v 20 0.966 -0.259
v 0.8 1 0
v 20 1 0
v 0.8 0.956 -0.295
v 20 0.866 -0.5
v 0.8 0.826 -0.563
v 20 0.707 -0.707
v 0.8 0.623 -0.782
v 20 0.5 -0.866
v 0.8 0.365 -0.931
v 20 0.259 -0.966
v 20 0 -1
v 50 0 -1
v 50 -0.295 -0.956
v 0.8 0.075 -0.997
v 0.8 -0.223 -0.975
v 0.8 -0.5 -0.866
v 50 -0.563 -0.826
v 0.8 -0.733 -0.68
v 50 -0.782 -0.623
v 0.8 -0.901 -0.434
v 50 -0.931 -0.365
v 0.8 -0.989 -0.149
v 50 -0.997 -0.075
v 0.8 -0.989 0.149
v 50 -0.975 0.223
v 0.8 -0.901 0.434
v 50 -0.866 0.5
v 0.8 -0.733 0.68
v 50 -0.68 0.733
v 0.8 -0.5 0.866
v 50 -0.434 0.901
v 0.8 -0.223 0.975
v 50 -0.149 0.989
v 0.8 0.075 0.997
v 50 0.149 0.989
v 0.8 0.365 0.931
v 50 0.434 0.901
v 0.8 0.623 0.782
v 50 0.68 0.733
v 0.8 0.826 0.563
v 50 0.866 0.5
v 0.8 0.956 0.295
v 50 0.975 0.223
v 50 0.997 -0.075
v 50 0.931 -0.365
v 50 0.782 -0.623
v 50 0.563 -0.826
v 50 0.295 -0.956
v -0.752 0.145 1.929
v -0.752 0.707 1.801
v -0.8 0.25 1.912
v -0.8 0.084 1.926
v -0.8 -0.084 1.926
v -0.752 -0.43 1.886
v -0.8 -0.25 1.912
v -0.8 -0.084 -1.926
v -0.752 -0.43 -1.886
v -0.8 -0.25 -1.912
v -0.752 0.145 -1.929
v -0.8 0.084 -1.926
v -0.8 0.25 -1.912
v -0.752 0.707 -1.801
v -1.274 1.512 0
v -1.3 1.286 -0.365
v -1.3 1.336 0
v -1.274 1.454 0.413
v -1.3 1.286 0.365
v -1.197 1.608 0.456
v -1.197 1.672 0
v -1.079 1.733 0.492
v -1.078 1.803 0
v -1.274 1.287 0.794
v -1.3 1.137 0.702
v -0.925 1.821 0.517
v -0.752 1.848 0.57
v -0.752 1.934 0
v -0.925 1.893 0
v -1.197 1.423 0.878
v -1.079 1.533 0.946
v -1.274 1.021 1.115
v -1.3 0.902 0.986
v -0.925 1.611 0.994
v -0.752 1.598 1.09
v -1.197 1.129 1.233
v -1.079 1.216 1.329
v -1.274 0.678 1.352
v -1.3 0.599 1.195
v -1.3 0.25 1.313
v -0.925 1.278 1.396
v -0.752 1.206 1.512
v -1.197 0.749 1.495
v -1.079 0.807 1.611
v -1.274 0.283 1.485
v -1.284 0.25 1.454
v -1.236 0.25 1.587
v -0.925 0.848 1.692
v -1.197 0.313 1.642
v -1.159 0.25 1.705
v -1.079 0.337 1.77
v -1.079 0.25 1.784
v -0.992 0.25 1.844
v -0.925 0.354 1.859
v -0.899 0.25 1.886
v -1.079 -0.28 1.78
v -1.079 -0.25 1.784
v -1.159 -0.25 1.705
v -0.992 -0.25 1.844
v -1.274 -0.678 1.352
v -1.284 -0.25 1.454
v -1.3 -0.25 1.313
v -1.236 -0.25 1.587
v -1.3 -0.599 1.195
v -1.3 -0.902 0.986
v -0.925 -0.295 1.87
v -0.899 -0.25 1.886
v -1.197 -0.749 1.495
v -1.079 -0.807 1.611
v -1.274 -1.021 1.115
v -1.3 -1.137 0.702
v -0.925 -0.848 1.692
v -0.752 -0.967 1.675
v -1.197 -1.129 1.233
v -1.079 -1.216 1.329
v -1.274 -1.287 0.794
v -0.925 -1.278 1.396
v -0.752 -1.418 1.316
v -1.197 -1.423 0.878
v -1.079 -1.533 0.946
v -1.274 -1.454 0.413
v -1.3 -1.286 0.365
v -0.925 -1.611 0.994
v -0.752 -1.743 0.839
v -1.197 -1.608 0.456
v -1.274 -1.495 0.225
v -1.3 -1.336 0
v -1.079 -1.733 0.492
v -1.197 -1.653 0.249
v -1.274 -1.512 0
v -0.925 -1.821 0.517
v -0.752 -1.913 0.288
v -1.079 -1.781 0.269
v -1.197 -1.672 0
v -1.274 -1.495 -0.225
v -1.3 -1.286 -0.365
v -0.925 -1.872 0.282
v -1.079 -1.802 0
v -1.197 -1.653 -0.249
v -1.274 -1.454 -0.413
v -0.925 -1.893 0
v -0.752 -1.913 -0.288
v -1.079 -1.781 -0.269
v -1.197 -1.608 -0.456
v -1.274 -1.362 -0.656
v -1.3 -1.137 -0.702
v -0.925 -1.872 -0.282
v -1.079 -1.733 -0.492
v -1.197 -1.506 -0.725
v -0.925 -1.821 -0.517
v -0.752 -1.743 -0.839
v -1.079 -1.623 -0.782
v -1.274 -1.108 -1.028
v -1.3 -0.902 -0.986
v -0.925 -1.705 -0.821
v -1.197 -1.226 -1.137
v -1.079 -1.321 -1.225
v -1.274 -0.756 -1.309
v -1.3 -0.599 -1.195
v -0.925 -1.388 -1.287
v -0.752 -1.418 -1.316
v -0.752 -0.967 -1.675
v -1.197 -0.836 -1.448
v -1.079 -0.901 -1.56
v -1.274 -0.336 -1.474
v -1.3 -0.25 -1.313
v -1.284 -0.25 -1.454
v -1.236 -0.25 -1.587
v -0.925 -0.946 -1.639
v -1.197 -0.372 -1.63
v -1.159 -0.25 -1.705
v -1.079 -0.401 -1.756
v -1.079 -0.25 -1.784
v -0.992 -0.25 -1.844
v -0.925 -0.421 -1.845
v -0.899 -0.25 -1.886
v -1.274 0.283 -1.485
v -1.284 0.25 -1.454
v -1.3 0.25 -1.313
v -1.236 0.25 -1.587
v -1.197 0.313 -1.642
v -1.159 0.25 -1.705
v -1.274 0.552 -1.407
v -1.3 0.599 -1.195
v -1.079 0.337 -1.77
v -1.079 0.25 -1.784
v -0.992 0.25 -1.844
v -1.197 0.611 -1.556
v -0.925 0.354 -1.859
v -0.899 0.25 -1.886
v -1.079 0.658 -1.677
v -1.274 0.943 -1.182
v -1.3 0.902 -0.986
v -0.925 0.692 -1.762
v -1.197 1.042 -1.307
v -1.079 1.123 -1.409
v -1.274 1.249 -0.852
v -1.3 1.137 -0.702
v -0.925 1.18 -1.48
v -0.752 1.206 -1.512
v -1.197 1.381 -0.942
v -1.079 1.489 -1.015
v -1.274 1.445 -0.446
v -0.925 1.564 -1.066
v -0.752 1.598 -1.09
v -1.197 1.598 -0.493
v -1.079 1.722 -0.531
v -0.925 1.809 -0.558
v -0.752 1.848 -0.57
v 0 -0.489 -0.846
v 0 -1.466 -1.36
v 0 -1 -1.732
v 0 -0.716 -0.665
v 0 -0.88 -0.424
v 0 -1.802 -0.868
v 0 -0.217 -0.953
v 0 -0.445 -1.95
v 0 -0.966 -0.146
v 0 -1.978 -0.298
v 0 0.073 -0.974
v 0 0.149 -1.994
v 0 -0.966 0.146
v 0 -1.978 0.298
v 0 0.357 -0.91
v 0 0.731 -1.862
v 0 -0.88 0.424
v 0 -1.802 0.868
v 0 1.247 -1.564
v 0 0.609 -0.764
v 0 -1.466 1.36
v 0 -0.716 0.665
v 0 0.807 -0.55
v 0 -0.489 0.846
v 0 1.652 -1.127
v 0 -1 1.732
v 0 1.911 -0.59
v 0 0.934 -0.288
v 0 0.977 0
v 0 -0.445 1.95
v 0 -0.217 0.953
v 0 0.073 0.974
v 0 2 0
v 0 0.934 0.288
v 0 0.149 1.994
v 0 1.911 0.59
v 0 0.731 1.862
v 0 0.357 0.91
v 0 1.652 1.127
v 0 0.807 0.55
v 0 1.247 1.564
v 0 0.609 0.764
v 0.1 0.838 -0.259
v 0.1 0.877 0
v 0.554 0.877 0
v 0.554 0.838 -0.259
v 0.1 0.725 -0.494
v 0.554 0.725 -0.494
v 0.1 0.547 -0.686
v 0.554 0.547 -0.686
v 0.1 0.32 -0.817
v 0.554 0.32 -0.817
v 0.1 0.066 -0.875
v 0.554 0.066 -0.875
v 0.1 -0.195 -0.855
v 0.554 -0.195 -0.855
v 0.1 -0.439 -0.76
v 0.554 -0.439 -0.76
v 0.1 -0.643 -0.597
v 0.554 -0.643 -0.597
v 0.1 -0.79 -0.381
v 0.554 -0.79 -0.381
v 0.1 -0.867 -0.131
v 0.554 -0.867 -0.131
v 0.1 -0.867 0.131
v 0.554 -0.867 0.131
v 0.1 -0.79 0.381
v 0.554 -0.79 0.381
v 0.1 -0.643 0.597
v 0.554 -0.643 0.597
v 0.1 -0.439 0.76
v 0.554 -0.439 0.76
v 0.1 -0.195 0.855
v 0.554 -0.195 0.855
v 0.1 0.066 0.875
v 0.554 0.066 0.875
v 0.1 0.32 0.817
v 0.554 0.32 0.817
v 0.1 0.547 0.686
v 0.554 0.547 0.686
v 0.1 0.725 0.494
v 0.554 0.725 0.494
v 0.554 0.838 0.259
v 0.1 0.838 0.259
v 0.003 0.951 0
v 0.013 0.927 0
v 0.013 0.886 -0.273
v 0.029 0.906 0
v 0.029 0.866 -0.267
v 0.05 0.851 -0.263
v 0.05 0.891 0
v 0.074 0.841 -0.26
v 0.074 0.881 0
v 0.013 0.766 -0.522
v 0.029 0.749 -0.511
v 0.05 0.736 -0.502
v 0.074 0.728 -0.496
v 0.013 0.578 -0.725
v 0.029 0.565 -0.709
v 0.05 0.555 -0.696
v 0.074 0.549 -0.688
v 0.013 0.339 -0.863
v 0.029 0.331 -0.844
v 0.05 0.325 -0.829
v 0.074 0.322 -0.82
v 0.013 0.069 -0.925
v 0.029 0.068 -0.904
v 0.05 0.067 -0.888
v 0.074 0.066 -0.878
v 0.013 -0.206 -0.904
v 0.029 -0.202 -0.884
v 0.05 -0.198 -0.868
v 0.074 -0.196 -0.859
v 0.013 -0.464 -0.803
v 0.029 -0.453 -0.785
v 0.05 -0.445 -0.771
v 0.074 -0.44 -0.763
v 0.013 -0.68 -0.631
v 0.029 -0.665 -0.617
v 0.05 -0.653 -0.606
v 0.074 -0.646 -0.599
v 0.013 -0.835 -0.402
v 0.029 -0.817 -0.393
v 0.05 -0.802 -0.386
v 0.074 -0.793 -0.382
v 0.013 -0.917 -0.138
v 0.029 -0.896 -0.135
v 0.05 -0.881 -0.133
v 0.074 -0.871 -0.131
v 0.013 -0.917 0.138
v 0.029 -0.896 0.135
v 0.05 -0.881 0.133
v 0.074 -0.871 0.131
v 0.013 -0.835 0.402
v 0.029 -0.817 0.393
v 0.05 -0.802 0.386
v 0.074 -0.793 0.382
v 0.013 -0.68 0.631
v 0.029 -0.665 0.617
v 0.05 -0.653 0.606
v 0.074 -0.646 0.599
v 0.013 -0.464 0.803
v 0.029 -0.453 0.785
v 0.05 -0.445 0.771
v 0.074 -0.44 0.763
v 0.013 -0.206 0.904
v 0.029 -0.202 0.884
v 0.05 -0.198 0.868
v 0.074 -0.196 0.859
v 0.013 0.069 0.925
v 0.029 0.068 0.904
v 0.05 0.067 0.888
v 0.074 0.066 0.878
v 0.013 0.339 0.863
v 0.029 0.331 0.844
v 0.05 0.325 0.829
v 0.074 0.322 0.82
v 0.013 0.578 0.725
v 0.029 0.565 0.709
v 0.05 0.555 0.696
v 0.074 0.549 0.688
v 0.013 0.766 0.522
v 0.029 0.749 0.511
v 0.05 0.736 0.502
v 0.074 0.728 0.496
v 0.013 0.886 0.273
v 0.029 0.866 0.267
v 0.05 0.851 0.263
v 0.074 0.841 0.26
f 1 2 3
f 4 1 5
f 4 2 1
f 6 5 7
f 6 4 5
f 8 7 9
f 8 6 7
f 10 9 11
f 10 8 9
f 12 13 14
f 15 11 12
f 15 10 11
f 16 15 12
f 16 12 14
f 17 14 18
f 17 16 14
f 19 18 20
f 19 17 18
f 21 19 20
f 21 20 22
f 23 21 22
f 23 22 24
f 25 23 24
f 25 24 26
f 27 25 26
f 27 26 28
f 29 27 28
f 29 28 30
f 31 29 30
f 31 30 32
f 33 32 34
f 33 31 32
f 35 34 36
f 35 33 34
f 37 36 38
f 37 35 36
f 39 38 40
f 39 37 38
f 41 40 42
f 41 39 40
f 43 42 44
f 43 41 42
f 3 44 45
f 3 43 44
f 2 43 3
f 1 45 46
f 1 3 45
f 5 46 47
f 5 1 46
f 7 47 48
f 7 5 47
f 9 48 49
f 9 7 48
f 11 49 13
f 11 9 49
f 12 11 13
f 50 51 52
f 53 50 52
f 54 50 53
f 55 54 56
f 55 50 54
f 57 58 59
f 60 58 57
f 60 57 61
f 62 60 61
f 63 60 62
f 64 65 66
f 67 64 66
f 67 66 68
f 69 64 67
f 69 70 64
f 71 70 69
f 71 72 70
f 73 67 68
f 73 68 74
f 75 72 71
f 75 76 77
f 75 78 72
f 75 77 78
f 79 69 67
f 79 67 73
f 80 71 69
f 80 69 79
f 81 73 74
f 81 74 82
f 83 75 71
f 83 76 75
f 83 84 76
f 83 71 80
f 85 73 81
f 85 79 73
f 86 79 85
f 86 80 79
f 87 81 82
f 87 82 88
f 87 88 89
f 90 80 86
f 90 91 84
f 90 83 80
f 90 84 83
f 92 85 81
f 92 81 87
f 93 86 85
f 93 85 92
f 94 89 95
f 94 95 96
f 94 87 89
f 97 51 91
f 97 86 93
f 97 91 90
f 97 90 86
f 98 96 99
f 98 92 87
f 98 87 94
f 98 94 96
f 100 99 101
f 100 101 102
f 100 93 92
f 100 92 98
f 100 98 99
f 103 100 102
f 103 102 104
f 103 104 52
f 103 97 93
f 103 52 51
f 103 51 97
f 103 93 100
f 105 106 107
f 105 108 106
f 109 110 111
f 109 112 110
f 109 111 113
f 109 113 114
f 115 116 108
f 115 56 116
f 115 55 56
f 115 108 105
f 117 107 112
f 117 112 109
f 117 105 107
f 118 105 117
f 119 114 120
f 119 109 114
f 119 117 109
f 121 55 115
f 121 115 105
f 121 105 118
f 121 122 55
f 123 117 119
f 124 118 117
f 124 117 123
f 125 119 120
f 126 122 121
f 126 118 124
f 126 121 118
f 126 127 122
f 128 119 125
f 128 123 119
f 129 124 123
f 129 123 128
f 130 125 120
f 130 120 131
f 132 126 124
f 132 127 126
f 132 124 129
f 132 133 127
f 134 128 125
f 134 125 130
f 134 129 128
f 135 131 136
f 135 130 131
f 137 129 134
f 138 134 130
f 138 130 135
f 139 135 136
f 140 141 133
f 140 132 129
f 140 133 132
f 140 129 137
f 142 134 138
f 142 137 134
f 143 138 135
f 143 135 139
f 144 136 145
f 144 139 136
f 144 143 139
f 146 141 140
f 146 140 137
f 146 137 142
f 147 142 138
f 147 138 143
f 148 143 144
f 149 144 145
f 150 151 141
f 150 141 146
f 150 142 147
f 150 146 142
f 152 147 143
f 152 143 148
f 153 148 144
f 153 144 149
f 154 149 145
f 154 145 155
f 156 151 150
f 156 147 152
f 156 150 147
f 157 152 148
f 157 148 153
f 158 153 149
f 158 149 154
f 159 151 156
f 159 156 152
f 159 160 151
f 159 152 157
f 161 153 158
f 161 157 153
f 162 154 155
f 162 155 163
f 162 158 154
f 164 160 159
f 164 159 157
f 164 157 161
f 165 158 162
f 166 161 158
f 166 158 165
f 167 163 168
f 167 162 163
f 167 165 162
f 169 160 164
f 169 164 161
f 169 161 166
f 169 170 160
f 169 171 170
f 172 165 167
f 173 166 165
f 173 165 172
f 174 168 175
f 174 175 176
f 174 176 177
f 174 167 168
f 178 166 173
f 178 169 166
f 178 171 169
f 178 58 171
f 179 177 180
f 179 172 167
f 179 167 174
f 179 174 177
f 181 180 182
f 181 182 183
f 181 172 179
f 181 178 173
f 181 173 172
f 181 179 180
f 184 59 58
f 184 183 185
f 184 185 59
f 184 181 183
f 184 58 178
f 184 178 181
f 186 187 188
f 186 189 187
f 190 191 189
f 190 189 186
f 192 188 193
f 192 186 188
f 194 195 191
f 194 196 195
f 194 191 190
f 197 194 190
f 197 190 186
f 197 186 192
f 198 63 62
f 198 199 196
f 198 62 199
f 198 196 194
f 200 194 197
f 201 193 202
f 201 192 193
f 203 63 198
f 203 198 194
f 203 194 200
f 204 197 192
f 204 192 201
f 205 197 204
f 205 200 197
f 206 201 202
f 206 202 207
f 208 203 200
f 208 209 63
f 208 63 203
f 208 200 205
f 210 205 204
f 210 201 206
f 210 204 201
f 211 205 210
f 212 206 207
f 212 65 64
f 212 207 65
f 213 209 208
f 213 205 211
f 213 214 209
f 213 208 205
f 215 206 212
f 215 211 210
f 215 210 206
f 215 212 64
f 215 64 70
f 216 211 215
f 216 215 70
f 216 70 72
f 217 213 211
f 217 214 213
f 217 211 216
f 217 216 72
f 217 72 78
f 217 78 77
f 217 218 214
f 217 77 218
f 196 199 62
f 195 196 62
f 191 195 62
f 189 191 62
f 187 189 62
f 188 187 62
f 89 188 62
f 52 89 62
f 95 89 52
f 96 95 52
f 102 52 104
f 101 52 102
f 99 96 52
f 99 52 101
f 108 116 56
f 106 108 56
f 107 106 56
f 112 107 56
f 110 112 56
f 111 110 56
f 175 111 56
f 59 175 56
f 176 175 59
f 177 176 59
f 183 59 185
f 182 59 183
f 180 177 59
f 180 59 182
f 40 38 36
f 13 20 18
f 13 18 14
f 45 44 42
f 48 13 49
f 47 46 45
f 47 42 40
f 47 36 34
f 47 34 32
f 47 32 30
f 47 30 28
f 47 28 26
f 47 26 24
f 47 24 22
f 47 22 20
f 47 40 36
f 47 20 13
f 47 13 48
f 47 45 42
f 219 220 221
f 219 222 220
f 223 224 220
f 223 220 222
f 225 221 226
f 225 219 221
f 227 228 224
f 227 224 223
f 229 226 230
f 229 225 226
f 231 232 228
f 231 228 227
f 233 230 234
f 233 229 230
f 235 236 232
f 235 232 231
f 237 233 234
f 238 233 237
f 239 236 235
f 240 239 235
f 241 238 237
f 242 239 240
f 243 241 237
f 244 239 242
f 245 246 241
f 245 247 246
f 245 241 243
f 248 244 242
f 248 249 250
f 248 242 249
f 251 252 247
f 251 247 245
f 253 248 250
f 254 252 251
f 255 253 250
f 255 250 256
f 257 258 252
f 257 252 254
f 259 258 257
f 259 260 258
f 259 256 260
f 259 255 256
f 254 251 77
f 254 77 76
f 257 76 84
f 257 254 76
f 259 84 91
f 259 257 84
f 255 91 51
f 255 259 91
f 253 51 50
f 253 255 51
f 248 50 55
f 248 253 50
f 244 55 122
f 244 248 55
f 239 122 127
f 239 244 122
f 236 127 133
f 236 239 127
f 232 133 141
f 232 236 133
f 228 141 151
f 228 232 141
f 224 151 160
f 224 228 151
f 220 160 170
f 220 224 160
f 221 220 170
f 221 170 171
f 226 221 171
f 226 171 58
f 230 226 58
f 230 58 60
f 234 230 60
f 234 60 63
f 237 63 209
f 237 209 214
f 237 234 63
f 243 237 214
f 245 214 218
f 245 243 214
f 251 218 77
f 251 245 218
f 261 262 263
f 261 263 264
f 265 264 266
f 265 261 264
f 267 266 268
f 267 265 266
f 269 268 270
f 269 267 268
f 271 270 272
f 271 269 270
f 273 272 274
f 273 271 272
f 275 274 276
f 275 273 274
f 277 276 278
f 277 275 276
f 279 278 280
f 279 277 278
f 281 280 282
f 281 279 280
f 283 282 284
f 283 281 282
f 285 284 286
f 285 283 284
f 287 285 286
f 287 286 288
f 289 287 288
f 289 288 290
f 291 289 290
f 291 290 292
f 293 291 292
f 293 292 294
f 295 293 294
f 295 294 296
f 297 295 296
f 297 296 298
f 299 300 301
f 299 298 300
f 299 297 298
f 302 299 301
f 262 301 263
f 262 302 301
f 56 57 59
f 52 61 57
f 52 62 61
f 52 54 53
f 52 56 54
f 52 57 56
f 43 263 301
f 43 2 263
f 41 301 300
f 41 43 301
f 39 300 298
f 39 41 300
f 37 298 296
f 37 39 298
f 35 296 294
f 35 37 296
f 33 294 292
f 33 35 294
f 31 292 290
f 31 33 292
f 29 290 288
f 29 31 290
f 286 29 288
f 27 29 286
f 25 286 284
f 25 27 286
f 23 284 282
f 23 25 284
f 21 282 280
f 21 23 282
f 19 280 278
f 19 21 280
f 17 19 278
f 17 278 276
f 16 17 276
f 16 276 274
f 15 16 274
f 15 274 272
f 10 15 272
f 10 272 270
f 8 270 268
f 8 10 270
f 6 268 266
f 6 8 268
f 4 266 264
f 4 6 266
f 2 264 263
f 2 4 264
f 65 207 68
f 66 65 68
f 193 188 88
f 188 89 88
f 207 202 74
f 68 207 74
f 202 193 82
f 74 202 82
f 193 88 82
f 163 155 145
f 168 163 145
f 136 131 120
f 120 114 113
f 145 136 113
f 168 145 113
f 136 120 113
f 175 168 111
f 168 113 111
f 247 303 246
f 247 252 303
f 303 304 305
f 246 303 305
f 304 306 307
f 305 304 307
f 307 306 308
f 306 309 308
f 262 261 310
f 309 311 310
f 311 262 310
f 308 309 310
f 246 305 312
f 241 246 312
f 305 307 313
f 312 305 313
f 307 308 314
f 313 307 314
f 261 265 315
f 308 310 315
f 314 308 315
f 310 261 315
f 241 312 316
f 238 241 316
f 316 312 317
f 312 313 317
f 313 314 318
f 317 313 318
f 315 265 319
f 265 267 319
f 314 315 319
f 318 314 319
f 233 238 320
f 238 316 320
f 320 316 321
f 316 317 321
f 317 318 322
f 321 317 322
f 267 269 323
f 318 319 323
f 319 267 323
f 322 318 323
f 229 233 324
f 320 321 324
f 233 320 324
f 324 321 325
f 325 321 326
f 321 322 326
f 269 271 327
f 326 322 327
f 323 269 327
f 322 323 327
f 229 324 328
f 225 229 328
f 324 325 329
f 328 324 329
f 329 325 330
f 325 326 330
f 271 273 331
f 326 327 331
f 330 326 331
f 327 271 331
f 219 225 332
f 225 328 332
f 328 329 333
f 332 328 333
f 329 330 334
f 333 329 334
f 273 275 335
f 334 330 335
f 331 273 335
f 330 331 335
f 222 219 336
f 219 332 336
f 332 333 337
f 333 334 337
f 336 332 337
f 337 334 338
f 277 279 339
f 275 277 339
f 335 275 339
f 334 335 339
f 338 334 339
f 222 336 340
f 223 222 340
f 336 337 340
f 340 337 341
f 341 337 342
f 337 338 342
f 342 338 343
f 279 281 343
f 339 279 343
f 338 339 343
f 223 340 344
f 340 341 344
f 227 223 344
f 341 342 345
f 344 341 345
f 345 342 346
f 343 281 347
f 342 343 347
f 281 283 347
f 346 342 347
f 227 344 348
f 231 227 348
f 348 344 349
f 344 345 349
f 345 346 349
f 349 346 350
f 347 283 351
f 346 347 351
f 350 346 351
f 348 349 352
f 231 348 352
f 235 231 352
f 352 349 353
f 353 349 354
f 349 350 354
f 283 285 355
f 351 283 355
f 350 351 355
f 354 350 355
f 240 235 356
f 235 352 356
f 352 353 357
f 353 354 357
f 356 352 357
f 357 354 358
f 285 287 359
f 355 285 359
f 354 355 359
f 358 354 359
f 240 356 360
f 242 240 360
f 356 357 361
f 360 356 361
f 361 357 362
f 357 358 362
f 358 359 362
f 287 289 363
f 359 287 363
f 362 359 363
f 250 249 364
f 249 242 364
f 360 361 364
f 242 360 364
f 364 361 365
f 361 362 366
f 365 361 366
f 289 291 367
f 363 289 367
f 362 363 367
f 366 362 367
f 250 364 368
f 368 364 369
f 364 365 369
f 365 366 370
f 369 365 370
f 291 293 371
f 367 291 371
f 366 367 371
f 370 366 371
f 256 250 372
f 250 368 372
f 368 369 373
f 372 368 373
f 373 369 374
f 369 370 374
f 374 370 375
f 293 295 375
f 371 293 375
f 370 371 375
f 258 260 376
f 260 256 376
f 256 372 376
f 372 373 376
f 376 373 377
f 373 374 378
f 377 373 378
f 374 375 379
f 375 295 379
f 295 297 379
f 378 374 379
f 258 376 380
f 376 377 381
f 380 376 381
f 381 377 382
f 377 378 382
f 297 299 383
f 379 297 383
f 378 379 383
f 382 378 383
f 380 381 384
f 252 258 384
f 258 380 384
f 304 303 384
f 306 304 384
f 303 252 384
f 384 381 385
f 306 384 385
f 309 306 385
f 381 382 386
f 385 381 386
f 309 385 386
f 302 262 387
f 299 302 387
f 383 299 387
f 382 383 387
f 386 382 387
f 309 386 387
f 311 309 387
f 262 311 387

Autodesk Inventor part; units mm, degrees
ref_plane "YZ Plane" through (0, 0, 0) normal (1, 0, 0) x (0, 1, 0)
ref_plane "XZ Plane" through (0, 0, 0) normal (0, 1, 0) x (-1, 0, 0)
sketch "Sketch1" plane through (0, 0, 0) normal (0, 0, 1) x (1, 0, 0)
  line L0 (-1.3, 0) -> (20, 0)
  line L1 (20, 0) -> (20, 1)
  line L2 (20, 1) -> (0.8, 1)
  line L3 (0.8, 1) -> (0.5545, 0.8772)
  line L4 (0.5545, 0.8772) -> (0, 0.8772)
  line L5 (0, 0.8772) -> (0, 2)
  line L6 (-5.56, 0) -> (24.26, 0) projected
  line L7 (0, -0.4) -> (0, 2.4) projected
  line L8 (-1.3, 0) -> (-1.3, 1.8863)
  line L9 (0, 2) -> (-1.3, 1.8863)
  line L10 (0.8, 1) -> (0, 1) construction
  dimension "d0" = 20
  dimension "d1" = 19.2
  dimension "d2" = 0.2455
  dimension "d3" = 1.3
  dimension "d4" = 2
  dimension "d5" = 1.7545
  dimension "d9" = 4
  dimension "d10" = 5
revolve "Body" add sketch "Sketch1" angle 360 about axis through (-1.3, 0, 0) along (1, 0, 0)
sketch "Sketch2" plane through (-1.3, 0, 0) normal (-1, 0, 0) x (0, 0, 1)
  circle A0 centre (0, 0) radius 2 projected
  line L0 (0, 0) -> (0, 1.8863) projected
  line L1 (-2, 0.25) -> (2, 0.25)
  line L2 (2, 0.25) -> (2, -0.25)
  line L3 (2, -0.25) -> (-2, -0.25)
  line L4 (-2, -0.25) -> (-2, 0.25)
  line L5 (-2, 0) -> (2, 0) construction
  line L6 (0, 0.25) -> (0, -0.25) construction
  dimension "d11" = 0.5
  dimension "d12" = 4
fillet "Fillet1" radius 0.6 1 edges at (-1.3, -1.8863, 0)
thread "Thread" size "M2x0.4" class "6g" standard "ISO Metric profile" length 19.2
extrude "Slot" cut sketch "Sketch2" against normal blind 0.5 contours A0 L3 L1 | L2 L3 A0 | A0 L1 L2 | A0 L4 L1 | L3 L4 A0
ref_plane "Work Plane1" through (30.1625, 0, 0) normal (0, 0, -1) x (1, 0, 0)
fillet "Fillet5" radius 0.1 1 edges at (0, -0.8772, 0)
sketch "Sketch4" plane through (20, 0, 0) normal (1, 0, 0) x (0, 0, -1)
  circle A0 centre (0, 0) radius 1
  dimension "d42" = 2
extrude "Extrusion4" add sketch "Sketch4" along normal blind 30
thread "Thread3" size "M2x0.4" class "6g" standard "ISO Metric profile" length 50
equation "\"d11\" = SBR"
equation "\"d12\" = KOD"
equation "\"d14\" = RR"
equation "\"d15\" = GEL"
equation "\"d19\" = STI"
equation "\"d41\" = R"
equation "\"d0\" = NLG"
equation "\"d1\" = GEL"
equation "\"d3\" = KOH"
equation "\"d4\" = GD"
equation "\"d5\" = BDM"
equation "\"d9\" = KOD"
equation "\"d10\" = KEWI"
equation "\"GD\" = NND"
equation "\"NLG\" = 20"
equation "\"GEL\" = 19.2"
equation "\"KOD\" = 4"
equation "\"KOH\" = 1.3"
equation "\"GAL\" = 0.61345 * PTC"
equation "\"R\" = 0.1"
equation "\"BDM\" = 1.7545"
equation "\"GUL\" = 0.61345 * PTC"
equation "\"RR\" = 0.6"
equation "\"SBR\" = 0.5"
equation "\"STI\" = 0.5"
equation "\"KEWI\" = 5deg"
equation "\"PTC\" = 0.4"
equation "\"THREADDIA\" = 2"
equation "\"TOA\" = 30deg"
equation "\"NND\" = 2"
equation "\"GD1\" = THREADDIA - 1.2269 * PTC"
properties part number "ISO 1580 - M2 x 20" material "Steel, Mild"
